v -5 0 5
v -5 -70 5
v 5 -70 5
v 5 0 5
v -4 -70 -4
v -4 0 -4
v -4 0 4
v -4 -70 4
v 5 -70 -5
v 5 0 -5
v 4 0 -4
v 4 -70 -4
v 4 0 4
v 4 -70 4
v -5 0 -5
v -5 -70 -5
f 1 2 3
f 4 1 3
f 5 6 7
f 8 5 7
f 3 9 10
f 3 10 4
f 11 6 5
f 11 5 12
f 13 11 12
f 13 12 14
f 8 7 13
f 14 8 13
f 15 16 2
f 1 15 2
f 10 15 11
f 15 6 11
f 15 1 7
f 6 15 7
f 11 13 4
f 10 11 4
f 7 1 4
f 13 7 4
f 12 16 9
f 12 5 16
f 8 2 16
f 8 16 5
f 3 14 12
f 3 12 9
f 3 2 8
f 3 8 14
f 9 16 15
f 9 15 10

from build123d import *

# Parameters (mm, degrees)
SKETCH_1_W      = 10
SKETCH_1_H      = 10
SKETCH_1_W_2    = 8
SKETCH_1_H_2    = 8
EXTRUDE_1_DEPTH = 70


with BuildPart() as part:
    # 草图1 → 凸台-拉伸1 (new body)
    with BuildSketch(Plane.XZ.offset(70)):
        Rectangle(SKETCH_1_W, SKETCH_1_H)
        Rectangle(SKETCH_1_W_2, SKETCH_1_H_2, mode=Mode.SUBTRACT)
    extrude(amount=-EXTRUDE_1_DEPTH)


solid = part.part
